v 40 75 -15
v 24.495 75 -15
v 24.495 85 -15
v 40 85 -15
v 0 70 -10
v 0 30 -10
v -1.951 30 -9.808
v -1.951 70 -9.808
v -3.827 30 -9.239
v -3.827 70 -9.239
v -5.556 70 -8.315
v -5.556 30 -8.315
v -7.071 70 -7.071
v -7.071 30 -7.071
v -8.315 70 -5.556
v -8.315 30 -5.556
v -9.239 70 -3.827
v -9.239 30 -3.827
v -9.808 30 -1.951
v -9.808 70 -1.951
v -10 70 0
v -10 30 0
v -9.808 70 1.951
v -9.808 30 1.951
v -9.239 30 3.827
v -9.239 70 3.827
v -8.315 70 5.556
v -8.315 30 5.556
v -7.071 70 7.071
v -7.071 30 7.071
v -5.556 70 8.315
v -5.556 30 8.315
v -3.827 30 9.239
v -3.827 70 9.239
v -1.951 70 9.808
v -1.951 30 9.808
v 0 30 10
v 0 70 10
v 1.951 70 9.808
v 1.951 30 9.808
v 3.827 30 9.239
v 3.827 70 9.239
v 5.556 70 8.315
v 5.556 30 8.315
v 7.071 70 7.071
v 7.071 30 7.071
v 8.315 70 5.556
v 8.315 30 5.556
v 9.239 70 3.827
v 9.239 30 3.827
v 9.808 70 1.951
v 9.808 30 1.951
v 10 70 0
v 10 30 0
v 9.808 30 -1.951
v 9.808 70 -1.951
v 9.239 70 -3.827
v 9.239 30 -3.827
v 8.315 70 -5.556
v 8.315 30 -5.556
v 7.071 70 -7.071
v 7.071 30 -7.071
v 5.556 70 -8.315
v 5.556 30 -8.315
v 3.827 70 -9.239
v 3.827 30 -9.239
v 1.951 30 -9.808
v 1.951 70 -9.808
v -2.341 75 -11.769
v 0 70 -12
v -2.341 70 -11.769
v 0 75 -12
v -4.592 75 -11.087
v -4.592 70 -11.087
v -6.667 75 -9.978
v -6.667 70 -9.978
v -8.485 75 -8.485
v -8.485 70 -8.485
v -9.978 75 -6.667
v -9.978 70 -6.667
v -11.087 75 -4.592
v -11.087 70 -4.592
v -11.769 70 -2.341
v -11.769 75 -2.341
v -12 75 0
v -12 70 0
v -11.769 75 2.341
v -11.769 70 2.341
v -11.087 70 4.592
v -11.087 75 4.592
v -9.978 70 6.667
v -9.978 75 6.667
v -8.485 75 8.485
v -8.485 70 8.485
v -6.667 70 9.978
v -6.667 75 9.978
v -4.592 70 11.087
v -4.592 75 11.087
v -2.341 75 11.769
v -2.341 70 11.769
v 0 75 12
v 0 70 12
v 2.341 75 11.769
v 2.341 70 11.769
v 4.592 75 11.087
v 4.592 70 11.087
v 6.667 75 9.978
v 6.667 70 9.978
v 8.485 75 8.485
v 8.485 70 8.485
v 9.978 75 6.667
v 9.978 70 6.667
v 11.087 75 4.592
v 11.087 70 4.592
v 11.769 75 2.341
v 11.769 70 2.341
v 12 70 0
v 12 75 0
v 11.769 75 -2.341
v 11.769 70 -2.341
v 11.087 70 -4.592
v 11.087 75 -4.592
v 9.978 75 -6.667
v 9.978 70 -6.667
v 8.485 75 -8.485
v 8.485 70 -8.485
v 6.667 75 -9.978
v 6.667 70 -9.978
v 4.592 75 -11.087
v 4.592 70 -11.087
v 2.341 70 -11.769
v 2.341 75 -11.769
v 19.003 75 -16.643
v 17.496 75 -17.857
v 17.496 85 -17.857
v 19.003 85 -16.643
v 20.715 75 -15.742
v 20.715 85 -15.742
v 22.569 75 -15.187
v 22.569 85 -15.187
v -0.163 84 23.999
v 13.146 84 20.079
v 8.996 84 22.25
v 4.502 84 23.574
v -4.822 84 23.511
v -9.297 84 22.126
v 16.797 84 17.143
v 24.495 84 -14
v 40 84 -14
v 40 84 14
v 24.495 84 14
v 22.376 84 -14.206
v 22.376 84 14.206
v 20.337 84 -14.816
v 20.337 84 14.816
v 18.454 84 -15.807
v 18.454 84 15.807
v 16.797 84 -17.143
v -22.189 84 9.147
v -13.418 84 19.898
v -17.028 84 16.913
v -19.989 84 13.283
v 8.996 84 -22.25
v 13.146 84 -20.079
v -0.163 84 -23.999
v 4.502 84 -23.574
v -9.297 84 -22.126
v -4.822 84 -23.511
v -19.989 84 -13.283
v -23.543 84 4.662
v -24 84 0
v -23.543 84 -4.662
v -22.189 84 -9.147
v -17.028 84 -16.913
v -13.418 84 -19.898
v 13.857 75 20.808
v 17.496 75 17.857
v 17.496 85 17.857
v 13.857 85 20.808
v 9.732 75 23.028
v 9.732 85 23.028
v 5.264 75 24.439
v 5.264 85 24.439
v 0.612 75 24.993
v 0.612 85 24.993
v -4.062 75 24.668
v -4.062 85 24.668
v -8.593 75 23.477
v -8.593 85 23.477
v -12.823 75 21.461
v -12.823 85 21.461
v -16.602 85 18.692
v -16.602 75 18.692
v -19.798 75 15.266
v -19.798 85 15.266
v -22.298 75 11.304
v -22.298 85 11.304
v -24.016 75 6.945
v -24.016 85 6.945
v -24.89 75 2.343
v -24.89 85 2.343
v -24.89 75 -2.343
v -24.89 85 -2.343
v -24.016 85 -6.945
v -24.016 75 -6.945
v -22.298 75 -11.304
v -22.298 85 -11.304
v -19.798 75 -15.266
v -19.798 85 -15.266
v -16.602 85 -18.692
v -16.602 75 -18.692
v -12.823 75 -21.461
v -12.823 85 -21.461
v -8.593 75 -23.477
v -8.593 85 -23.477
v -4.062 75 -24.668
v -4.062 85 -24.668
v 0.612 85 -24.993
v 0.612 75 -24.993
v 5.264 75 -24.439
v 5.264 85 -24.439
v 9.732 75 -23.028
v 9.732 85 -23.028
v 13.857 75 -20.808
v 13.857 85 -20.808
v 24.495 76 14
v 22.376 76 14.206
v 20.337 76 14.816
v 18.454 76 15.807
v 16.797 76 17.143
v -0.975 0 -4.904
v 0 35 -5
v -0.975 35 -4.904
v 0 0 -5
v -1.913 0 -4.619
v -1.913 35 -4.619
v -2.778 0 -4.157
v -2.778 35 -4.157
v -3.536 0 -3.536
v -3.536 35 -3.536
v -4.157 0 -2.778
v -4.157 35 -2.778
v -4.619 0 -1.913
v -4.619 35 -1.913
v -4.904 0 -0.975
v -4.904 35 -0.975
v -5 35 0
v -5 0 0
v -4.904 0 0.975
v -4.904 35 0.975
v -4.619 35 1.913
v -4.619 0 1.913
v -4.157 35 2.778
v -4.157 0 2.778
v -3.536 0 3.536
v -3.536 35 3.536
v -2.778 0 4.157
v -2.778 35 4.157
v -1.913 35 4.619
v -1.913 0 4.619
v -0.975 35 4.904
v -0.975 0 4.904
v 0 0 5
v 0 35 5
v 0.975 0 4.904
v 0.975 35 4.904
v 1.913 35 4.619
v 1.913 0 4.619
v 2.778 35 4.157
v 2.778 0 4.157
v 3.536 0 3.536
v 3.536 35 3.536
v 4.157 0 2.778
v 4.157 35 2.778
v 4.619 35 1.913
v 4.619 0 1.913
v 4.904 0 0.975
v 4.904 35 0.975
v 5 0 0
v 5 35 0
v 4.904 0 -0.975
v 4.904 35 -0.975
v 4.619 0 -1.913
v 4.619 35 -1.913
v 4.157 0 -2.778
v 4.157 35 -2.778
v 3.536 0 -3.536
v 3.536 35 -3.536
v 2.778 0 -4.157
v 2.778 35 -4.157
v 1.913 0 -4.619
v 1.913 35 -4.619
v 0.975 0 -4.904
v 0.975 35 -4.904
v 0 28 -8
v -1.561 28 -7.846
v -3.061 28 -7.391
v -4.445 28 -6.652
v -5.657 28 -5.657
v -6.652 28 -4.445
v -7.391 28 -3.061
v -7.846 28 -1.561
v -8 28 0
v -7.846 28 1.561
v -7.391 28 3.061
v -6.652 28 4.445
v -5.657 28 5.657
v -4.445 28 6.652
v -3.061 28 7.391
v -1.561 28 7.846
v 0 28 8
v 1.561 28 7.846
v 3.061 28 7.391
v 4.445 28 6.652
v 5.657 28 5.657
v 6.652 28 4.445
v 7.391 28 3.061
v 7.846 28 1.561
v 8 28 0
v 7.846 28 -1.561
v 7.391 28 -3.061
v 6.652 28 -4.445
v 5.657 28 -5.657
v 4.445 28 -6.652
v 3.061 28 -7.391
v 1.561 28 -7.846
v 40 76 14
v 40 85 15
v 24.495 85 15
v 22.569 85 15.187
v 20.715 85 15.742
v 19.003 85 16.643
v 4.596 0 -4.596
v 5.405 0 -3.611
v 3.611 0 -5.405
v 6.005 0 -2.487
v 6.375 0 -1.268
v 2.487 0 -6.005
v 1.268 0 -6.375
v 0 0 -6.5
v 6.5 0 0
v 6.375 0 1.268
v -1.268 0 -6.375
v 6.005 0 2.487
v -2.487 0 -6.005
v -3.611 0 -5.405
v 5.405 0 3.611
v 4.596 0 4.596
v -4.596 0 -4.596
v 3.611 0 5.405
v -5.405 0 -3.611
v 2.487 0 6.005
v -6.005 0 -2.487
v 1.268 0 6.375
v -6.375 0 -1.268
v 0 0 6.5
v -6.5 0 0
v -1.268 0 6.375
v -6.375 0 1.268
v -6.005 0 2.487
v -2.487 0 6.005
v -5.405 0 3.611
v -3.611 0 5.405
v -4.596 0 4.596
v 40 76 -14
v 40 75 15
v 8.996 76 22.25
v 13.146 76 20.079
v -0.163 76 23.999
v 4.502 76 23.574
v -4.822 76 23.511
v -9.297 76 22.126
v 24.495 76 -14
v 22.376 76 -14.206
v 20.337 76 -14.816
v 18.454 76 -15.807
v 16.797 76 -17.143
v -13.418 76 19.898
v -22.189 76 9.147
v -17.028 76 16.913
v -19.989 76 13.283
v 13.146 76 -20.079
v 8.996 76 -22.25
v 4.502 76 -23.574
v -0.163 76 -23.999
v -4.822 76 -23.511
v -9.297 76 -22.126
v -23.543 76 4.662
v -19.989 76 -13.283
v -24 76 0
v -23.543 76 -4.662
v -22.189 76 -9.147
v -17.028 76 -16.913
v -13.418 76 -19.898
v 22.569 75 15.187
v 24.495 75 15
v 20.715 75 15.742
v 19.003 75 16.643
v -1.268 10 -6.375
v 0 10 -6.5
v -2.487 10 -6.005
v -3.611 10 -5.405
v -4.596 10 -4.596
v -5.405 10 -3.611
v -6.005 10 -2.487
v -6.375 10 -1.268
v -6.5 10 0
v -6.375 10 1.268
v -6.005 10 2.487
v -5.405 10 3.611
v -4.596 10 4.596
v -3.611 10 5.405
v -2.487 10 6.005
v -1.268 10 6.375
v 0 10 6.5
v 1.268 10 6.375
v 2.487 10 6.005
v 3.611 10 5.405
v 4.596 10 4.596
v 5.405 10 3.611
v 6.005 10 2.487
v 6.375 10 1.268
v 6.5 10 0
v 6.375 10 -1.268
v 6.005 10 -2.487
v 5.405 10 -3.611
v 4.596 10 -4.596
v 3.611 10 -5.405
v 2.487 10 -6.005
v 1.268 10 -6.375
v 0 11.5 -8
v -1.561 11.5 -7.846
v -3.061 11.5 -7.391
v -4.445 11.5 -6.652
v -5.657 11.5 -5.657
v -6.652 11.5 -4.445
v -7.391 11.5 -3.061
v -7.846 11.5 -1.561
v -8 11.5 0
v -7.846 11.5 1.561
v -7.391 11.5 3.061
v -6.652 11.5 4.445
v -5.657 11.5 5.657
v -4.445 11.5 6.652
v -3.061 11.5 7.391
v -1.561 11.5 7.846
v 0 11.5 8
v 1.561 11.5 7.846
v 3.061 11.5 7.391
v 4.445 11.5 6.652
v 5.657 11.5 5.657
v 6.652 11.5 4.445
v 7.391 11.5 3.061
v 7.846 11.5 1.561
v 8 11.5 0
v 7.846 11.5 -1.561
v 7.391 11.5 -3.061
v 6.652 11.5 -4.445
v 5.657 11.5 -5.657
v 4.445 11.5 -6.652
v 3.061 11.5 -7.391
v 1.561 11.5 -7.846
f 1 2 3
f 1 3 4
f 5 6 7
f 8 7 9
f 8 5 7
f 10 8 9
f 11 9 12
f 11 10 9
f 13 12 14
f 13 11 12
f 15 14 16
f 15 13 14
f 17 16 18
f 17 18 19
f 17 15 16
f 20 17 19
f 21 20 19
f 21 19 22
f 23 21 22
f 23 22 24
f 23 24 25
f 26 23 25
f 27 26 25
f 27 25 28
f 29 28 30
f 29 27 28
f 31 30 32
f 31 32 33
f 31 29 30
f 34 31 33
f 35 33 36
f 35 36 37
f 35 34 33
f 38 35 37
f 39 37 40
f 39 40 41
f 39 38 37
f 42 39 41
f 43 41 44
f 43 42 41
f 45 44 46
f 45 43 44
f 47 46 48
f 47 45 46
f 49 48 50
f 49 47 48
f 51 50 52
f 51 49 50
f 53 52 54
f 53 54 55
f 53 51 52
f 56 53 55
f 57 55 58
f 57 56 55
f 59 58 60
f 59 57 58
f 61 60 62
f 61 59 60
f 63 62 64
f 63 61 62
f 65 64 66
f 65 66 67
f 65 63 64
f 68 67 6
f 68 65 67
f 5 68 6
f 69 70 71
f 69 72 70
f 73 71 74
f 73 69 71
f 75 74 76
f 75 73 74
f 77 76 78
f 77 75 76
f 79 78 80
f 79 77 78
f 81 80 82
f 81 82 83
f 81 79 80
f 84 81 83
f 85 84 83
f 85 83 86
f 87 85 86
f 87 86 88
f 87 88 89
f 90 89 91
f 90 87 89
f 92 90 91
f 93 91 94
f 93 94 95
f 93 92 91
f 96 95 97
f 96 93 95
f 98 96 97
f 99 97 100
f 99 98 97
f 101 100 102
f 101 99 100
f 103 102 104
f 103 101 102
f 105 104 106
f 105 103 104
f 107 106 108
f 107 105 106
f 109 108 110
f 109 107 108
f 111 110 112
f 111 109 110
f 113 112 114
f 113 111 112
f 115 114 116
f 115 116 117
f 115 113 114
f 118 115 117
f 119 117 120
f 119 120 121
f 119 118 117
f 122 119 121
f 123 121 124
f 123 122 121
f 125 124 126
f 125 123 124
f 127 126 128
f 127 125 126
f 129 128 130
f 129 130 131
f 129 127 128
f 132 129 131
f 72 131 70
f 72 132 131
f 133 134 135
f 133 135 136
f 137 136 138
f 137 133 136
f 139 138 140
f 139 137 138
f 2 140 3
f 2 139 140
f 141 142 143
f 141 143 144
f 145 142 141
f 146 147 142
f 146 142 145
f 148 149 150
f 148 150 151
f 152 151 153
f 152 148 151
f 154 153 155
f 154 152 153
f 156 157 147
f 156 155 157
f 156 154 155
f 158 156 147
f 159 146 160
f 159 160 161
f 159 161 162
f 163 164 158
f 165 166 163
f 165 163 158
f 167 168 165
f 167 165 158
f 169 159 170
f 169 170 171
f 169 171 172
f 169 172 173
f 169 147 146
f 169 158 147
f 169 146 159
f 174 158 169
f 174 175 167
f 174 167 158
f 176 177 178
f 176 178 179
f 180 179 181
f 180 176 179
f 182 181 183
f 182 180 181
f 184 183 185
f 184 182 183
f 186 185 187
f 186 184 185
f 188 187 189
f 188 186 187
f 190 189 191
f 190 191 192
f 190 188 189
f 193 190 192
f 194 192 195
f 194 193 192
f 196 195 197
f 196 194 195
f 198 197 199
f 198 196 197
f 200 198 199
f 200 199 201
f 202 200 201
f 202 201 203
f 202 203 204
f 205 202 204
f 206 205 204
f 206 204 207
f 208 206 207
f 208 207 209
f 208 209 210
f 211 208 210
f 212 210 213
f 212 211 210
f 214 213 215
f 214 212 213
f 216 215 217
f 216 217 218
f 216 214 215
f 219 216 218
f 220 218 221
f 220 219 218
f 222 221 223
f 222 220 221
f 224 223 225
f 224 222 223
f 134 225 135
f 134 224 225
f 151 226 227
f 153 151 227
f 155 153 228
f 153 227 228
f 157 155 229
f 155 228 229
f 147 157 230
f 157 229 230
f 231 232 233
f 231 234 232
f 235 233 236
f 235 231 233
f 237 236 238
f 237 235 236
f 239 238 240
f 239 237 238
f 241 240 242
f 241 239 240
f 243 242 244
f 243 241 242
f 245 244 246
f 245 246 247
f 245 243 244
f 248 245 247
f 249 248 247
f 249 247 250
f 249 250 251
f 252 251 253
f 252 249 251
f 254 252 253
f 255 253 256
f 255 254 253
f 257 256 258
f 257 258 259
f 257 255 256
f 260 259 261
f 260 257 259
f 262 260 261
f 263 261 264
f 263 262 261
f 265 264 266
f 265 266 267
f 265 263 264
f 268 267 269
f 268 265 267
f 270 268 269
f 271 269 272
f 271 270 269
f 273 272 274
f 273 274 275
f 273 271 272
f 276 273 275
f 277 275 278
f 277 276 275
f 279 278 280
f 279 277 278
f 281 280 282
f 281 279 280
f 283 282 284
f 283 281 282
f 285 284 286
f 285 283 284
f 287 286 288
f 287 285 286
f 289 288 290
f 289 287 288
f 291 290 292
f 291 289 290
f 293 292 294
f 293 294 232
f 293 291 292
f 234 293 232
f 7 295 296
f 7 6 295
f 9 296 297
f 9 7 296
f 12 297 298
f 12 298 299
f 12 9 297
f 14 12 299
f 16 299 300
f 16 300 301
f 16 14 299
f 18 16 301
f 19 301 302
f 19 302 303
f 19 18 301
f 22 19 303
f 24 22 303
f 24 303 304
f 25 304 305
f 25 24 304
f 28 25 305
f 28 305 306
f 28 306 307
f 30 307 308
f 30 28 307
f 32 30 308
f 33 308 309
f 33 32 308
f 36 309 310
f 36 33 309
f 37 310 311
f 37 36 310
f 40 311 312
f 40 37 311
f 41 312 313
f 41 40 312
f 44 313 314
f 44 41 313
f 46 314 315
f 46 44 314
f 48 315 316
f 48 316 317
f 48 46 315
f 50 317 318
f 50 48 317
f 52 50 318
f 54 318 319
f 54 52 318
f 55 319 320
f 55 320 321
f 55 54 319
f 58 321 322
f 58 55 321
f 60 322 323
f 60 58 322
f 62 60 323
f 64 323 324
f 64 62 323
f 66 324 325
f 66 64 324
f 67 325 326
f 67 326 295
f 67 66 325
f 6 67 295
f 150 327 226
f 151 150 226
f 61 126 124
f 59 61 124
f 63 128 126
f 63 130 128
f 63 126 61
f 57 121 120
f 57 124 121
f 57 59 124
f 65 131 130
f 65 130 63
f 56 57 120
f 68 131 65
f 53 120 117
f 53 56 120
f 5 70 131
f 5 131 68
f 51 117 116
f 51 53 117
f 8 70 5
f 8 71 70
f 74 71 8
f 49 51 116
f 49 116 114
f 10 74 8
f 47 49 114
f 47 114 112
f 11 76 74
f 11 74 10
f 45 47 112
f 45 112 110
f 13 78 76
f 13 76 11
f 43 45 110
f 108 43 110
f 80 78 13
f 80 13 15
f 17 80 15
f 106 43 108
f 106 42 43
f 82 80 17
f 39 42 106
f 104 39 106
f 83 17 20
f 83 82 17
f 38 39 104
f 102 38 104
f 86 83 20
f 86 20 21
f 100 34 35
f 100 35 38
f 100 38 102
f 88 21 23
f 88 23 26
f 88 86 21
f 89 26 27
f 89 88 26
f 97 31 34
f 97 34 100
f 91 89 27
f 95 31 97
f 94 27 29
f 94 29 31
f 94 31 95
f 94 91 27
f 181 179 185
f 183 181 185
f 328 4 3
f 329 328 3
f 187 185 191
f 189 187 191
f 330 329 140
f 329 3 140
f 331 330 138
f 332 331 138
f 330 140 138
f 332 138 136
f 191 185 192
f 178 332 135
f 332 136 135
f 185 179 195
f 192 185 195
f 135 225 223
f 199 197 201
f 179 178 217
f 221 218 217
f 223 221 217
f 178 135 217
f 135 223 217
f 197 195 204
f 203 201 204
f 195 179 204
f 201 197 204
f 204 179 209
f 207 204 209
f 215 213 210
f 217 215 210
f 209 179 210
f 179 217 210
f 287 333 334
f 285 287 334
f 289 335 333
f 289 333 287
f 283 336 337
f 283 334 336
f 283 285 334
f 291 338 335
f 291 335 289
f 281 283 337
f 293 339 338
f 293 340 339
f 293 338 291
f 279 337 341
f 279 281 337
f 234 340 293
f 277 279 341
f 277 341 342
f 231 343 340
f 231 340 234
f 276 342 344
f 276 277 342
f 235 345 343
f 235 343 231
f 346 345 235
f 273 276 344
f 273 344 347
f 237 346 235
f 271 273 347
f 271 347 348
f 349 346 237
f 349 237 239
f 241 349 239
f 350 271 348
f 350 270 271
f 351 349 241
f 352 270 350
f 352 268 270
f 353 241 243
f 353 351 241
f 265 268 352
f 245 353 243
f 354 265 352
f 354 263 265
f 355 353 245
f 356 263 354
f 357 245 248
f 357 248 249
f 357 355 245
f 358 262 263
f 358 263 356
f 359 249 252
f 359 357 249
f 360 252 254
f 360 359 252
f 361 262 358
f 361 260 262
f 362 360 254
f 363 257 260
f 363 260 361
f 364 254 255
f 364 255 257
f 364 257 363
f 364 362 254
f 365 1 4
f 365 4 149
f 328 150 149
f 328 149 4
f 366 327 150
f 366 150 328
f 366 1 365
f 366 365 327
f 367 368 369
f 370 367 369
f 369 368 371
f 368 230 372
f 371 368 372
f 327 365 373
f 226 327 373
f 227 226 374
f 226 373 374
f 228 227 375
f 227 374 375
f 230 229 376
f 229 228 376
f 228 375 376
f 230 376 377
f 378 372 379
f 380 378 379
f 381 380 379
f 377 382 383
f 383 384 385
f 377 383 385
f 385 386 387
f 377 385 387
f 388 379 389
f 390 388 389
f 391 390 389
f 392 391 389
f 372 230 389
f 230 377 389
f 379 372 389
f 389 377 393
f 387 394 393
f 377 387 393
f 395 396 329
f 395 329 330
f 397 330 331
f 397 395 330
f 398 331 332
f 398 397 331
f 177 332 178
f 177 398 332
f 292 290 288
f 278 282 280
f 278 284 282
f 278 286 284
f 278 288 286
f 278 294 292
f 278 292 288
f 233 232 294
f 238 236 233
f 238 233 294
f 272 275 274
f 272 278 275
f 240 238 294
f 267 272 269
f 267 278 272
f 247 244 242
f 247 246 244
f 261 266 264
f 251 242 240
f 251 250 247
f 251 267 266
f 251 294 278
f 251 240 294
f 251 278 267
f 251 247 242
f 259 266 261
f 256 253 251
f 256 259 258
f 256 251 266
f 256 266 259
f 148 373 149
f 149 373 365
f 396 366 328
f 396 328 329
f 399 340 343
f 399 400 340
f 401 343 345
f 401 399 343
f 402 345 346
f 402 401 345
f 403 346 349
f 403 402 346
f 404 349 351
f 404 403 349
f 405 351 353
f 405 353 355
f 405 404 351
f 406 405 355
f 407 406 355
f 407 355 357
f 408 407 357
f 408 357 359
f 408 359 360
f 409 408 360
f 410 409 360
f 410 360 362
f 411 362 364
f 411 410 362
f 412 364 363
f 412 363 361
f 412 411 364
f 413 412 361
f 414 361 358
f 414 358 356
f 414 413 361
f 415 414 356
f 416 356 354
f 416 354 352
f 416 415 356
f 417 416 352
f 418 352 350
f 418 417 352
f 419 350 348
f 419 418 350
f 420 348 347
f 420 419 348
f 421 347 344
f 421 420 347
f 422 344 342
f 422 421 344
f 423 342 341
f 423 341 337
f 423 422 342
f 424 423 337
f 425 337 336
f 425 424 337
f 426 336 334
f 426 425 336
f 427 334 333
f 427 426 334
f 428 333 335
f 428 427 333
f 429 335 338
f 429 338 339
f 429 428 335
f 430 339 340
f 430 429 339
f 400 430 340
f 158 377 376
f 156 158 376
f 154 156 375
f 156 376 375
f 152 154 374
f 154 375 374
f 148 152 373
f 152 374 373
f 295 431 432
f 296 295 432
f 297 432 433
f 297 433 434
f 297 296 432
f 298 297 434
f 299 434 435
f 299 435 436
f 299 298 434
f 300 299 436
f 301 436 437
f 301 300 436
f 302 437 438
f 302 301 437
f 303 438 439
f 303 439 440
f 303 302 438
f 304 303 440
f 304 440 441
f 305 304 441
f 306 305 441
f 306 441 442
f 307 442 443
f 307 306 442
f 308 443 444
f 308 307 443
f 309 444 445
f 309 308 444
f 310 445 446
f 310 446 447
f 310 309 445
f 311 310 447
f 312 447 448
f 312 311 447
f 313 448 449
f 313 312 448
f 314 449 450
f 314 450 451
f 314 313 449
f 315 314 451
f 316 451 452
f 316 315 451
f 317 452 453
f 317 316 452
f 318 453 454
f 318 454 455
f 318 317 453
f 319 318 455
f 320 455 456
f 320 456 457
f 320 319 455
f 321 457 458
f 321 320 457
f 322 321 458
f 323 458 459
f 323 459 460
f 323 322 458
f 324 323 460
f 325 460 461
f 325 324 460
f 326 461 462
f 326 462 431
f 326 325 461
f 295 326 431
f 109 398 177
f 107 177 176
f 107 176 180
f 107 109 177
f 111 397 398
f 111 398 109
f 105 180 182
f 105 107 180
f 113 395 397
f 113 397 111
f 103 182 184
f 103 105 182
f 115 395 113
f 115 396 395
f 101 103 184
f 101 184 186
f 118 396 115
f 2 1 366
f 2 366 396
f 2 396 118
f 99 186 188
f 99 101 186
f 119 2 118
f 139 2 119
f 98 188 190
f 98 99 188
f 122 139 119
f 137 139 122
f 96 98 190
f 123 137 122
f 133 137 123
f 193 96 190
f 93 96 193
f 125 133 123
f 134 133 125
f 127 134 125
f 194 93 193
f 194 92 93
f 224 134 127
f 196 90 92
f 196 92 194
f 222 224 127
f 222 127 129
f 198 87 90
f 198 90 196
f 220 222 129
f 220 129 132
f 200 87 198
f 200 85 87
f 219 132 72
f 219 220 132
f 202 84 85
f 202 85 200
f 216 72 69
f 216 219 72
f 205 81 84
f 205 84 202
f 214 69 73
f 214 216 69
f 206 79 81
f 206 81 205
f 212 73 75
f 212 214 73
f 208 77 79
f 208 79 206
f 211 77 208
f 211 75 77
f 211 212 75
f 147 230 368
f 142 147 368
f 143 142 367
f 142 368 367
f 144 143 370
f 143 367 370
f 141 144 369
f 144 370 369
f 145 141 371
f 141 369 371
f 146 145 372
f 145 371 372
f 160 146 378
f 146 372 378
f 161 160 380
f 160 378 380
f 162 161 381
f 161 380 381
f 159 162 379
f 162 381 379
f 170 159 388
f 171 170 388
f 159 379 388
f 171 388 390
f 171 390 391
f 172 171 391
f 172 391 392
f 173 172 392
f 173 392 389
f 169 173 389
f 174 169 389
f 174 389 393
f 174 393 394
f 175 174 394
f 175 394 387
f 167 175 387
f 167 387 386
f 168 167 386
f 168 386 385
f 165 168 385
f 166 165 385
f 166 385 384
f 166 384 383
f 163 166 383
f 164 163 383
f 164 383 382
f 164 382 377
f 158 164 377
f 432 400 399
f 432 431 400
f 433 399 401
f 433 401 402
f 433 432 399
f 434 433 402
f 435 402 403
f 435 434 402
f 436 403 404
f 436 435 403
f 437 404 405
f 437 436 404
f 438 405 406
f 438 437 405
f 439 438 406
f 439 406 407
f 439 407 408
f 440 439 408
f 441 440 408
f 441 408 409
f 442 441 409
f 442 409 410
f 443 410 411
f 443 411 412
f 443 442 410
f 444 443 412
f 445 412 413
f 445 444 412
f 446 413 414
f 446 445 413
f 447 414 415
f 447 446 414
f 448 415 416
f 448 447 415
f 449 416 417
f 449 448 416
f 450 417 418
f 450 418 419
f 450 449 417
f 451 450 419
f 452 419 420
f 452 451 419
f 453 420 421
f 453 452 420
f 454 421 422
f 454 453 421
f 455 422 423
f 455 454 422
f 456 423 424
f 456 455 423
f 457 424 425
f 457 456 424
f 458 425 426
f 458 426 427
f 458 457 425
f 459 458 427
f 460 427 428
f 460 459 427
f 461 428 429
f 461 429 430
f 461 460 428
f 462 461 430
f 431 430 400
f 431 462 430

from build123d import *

# Parameters (mm, degrees)
BOSS_EXTRUDE1_DEPTH = 10
SHELL1_T            = -1


with BuildPart() as part:
    # Sketch1 → Revolve1 (revolve)
    with BuildSketch(Plane(origin=(0, 0, 0), x_dir=(0, 0, -1), z_dir=(1, 0, 0))):
        Polygon((5, 0), (6.5, 0), (6.5, 10), (8, 11.5), (8, 28), (10, 30), (10, 70), (12, 70), (12, 75), (0, 75), (0, 35), (5, 35), align=None)
    revolve(axis=Axis((0, 0, 0), (0, 1, 0)))


with BuildPart() as body_2:
    # Sketch2 → Boss-Extrude1 (new body)
    with BuildSketch(Plane(origin=(0, 75, 0), x_dir=(1, 0, 0), z_dir=(0, 1, 0))):
        with BuildLine():
            Line((24.494897428, 15), (40, 15))
            Line((40, 15), (40, -15))
            Line((40, -15), (24.494897428, -15))
            ThreePointArc((24.494897428, -15), (20.715252698, -15.741799002), (17.496355306, -17.857142857))
            ThreePointArc((17.496355306, -17.857142857), (-25, 0), (17.496355306, 17.857142857))
            ThreePointArc((17.496355306, 17.857142857), (20.715252698, 15.741799002), (24.494897428, 15))
        make_face()
    extrude(amount=BOSS_EXTRUDE1_DEPTH)

    # Shell1
    shell1_openings = [body_2.faces().sort_by_distance(p)[0] for p in [
        (40, 80, 0),
    ]]
    offset(amount=SHELL1_T, openings=shell1_openings, kind=Kind.INTERSECTION)

    # Combine1: union part
    add(part.part)


solid = body_2.part
